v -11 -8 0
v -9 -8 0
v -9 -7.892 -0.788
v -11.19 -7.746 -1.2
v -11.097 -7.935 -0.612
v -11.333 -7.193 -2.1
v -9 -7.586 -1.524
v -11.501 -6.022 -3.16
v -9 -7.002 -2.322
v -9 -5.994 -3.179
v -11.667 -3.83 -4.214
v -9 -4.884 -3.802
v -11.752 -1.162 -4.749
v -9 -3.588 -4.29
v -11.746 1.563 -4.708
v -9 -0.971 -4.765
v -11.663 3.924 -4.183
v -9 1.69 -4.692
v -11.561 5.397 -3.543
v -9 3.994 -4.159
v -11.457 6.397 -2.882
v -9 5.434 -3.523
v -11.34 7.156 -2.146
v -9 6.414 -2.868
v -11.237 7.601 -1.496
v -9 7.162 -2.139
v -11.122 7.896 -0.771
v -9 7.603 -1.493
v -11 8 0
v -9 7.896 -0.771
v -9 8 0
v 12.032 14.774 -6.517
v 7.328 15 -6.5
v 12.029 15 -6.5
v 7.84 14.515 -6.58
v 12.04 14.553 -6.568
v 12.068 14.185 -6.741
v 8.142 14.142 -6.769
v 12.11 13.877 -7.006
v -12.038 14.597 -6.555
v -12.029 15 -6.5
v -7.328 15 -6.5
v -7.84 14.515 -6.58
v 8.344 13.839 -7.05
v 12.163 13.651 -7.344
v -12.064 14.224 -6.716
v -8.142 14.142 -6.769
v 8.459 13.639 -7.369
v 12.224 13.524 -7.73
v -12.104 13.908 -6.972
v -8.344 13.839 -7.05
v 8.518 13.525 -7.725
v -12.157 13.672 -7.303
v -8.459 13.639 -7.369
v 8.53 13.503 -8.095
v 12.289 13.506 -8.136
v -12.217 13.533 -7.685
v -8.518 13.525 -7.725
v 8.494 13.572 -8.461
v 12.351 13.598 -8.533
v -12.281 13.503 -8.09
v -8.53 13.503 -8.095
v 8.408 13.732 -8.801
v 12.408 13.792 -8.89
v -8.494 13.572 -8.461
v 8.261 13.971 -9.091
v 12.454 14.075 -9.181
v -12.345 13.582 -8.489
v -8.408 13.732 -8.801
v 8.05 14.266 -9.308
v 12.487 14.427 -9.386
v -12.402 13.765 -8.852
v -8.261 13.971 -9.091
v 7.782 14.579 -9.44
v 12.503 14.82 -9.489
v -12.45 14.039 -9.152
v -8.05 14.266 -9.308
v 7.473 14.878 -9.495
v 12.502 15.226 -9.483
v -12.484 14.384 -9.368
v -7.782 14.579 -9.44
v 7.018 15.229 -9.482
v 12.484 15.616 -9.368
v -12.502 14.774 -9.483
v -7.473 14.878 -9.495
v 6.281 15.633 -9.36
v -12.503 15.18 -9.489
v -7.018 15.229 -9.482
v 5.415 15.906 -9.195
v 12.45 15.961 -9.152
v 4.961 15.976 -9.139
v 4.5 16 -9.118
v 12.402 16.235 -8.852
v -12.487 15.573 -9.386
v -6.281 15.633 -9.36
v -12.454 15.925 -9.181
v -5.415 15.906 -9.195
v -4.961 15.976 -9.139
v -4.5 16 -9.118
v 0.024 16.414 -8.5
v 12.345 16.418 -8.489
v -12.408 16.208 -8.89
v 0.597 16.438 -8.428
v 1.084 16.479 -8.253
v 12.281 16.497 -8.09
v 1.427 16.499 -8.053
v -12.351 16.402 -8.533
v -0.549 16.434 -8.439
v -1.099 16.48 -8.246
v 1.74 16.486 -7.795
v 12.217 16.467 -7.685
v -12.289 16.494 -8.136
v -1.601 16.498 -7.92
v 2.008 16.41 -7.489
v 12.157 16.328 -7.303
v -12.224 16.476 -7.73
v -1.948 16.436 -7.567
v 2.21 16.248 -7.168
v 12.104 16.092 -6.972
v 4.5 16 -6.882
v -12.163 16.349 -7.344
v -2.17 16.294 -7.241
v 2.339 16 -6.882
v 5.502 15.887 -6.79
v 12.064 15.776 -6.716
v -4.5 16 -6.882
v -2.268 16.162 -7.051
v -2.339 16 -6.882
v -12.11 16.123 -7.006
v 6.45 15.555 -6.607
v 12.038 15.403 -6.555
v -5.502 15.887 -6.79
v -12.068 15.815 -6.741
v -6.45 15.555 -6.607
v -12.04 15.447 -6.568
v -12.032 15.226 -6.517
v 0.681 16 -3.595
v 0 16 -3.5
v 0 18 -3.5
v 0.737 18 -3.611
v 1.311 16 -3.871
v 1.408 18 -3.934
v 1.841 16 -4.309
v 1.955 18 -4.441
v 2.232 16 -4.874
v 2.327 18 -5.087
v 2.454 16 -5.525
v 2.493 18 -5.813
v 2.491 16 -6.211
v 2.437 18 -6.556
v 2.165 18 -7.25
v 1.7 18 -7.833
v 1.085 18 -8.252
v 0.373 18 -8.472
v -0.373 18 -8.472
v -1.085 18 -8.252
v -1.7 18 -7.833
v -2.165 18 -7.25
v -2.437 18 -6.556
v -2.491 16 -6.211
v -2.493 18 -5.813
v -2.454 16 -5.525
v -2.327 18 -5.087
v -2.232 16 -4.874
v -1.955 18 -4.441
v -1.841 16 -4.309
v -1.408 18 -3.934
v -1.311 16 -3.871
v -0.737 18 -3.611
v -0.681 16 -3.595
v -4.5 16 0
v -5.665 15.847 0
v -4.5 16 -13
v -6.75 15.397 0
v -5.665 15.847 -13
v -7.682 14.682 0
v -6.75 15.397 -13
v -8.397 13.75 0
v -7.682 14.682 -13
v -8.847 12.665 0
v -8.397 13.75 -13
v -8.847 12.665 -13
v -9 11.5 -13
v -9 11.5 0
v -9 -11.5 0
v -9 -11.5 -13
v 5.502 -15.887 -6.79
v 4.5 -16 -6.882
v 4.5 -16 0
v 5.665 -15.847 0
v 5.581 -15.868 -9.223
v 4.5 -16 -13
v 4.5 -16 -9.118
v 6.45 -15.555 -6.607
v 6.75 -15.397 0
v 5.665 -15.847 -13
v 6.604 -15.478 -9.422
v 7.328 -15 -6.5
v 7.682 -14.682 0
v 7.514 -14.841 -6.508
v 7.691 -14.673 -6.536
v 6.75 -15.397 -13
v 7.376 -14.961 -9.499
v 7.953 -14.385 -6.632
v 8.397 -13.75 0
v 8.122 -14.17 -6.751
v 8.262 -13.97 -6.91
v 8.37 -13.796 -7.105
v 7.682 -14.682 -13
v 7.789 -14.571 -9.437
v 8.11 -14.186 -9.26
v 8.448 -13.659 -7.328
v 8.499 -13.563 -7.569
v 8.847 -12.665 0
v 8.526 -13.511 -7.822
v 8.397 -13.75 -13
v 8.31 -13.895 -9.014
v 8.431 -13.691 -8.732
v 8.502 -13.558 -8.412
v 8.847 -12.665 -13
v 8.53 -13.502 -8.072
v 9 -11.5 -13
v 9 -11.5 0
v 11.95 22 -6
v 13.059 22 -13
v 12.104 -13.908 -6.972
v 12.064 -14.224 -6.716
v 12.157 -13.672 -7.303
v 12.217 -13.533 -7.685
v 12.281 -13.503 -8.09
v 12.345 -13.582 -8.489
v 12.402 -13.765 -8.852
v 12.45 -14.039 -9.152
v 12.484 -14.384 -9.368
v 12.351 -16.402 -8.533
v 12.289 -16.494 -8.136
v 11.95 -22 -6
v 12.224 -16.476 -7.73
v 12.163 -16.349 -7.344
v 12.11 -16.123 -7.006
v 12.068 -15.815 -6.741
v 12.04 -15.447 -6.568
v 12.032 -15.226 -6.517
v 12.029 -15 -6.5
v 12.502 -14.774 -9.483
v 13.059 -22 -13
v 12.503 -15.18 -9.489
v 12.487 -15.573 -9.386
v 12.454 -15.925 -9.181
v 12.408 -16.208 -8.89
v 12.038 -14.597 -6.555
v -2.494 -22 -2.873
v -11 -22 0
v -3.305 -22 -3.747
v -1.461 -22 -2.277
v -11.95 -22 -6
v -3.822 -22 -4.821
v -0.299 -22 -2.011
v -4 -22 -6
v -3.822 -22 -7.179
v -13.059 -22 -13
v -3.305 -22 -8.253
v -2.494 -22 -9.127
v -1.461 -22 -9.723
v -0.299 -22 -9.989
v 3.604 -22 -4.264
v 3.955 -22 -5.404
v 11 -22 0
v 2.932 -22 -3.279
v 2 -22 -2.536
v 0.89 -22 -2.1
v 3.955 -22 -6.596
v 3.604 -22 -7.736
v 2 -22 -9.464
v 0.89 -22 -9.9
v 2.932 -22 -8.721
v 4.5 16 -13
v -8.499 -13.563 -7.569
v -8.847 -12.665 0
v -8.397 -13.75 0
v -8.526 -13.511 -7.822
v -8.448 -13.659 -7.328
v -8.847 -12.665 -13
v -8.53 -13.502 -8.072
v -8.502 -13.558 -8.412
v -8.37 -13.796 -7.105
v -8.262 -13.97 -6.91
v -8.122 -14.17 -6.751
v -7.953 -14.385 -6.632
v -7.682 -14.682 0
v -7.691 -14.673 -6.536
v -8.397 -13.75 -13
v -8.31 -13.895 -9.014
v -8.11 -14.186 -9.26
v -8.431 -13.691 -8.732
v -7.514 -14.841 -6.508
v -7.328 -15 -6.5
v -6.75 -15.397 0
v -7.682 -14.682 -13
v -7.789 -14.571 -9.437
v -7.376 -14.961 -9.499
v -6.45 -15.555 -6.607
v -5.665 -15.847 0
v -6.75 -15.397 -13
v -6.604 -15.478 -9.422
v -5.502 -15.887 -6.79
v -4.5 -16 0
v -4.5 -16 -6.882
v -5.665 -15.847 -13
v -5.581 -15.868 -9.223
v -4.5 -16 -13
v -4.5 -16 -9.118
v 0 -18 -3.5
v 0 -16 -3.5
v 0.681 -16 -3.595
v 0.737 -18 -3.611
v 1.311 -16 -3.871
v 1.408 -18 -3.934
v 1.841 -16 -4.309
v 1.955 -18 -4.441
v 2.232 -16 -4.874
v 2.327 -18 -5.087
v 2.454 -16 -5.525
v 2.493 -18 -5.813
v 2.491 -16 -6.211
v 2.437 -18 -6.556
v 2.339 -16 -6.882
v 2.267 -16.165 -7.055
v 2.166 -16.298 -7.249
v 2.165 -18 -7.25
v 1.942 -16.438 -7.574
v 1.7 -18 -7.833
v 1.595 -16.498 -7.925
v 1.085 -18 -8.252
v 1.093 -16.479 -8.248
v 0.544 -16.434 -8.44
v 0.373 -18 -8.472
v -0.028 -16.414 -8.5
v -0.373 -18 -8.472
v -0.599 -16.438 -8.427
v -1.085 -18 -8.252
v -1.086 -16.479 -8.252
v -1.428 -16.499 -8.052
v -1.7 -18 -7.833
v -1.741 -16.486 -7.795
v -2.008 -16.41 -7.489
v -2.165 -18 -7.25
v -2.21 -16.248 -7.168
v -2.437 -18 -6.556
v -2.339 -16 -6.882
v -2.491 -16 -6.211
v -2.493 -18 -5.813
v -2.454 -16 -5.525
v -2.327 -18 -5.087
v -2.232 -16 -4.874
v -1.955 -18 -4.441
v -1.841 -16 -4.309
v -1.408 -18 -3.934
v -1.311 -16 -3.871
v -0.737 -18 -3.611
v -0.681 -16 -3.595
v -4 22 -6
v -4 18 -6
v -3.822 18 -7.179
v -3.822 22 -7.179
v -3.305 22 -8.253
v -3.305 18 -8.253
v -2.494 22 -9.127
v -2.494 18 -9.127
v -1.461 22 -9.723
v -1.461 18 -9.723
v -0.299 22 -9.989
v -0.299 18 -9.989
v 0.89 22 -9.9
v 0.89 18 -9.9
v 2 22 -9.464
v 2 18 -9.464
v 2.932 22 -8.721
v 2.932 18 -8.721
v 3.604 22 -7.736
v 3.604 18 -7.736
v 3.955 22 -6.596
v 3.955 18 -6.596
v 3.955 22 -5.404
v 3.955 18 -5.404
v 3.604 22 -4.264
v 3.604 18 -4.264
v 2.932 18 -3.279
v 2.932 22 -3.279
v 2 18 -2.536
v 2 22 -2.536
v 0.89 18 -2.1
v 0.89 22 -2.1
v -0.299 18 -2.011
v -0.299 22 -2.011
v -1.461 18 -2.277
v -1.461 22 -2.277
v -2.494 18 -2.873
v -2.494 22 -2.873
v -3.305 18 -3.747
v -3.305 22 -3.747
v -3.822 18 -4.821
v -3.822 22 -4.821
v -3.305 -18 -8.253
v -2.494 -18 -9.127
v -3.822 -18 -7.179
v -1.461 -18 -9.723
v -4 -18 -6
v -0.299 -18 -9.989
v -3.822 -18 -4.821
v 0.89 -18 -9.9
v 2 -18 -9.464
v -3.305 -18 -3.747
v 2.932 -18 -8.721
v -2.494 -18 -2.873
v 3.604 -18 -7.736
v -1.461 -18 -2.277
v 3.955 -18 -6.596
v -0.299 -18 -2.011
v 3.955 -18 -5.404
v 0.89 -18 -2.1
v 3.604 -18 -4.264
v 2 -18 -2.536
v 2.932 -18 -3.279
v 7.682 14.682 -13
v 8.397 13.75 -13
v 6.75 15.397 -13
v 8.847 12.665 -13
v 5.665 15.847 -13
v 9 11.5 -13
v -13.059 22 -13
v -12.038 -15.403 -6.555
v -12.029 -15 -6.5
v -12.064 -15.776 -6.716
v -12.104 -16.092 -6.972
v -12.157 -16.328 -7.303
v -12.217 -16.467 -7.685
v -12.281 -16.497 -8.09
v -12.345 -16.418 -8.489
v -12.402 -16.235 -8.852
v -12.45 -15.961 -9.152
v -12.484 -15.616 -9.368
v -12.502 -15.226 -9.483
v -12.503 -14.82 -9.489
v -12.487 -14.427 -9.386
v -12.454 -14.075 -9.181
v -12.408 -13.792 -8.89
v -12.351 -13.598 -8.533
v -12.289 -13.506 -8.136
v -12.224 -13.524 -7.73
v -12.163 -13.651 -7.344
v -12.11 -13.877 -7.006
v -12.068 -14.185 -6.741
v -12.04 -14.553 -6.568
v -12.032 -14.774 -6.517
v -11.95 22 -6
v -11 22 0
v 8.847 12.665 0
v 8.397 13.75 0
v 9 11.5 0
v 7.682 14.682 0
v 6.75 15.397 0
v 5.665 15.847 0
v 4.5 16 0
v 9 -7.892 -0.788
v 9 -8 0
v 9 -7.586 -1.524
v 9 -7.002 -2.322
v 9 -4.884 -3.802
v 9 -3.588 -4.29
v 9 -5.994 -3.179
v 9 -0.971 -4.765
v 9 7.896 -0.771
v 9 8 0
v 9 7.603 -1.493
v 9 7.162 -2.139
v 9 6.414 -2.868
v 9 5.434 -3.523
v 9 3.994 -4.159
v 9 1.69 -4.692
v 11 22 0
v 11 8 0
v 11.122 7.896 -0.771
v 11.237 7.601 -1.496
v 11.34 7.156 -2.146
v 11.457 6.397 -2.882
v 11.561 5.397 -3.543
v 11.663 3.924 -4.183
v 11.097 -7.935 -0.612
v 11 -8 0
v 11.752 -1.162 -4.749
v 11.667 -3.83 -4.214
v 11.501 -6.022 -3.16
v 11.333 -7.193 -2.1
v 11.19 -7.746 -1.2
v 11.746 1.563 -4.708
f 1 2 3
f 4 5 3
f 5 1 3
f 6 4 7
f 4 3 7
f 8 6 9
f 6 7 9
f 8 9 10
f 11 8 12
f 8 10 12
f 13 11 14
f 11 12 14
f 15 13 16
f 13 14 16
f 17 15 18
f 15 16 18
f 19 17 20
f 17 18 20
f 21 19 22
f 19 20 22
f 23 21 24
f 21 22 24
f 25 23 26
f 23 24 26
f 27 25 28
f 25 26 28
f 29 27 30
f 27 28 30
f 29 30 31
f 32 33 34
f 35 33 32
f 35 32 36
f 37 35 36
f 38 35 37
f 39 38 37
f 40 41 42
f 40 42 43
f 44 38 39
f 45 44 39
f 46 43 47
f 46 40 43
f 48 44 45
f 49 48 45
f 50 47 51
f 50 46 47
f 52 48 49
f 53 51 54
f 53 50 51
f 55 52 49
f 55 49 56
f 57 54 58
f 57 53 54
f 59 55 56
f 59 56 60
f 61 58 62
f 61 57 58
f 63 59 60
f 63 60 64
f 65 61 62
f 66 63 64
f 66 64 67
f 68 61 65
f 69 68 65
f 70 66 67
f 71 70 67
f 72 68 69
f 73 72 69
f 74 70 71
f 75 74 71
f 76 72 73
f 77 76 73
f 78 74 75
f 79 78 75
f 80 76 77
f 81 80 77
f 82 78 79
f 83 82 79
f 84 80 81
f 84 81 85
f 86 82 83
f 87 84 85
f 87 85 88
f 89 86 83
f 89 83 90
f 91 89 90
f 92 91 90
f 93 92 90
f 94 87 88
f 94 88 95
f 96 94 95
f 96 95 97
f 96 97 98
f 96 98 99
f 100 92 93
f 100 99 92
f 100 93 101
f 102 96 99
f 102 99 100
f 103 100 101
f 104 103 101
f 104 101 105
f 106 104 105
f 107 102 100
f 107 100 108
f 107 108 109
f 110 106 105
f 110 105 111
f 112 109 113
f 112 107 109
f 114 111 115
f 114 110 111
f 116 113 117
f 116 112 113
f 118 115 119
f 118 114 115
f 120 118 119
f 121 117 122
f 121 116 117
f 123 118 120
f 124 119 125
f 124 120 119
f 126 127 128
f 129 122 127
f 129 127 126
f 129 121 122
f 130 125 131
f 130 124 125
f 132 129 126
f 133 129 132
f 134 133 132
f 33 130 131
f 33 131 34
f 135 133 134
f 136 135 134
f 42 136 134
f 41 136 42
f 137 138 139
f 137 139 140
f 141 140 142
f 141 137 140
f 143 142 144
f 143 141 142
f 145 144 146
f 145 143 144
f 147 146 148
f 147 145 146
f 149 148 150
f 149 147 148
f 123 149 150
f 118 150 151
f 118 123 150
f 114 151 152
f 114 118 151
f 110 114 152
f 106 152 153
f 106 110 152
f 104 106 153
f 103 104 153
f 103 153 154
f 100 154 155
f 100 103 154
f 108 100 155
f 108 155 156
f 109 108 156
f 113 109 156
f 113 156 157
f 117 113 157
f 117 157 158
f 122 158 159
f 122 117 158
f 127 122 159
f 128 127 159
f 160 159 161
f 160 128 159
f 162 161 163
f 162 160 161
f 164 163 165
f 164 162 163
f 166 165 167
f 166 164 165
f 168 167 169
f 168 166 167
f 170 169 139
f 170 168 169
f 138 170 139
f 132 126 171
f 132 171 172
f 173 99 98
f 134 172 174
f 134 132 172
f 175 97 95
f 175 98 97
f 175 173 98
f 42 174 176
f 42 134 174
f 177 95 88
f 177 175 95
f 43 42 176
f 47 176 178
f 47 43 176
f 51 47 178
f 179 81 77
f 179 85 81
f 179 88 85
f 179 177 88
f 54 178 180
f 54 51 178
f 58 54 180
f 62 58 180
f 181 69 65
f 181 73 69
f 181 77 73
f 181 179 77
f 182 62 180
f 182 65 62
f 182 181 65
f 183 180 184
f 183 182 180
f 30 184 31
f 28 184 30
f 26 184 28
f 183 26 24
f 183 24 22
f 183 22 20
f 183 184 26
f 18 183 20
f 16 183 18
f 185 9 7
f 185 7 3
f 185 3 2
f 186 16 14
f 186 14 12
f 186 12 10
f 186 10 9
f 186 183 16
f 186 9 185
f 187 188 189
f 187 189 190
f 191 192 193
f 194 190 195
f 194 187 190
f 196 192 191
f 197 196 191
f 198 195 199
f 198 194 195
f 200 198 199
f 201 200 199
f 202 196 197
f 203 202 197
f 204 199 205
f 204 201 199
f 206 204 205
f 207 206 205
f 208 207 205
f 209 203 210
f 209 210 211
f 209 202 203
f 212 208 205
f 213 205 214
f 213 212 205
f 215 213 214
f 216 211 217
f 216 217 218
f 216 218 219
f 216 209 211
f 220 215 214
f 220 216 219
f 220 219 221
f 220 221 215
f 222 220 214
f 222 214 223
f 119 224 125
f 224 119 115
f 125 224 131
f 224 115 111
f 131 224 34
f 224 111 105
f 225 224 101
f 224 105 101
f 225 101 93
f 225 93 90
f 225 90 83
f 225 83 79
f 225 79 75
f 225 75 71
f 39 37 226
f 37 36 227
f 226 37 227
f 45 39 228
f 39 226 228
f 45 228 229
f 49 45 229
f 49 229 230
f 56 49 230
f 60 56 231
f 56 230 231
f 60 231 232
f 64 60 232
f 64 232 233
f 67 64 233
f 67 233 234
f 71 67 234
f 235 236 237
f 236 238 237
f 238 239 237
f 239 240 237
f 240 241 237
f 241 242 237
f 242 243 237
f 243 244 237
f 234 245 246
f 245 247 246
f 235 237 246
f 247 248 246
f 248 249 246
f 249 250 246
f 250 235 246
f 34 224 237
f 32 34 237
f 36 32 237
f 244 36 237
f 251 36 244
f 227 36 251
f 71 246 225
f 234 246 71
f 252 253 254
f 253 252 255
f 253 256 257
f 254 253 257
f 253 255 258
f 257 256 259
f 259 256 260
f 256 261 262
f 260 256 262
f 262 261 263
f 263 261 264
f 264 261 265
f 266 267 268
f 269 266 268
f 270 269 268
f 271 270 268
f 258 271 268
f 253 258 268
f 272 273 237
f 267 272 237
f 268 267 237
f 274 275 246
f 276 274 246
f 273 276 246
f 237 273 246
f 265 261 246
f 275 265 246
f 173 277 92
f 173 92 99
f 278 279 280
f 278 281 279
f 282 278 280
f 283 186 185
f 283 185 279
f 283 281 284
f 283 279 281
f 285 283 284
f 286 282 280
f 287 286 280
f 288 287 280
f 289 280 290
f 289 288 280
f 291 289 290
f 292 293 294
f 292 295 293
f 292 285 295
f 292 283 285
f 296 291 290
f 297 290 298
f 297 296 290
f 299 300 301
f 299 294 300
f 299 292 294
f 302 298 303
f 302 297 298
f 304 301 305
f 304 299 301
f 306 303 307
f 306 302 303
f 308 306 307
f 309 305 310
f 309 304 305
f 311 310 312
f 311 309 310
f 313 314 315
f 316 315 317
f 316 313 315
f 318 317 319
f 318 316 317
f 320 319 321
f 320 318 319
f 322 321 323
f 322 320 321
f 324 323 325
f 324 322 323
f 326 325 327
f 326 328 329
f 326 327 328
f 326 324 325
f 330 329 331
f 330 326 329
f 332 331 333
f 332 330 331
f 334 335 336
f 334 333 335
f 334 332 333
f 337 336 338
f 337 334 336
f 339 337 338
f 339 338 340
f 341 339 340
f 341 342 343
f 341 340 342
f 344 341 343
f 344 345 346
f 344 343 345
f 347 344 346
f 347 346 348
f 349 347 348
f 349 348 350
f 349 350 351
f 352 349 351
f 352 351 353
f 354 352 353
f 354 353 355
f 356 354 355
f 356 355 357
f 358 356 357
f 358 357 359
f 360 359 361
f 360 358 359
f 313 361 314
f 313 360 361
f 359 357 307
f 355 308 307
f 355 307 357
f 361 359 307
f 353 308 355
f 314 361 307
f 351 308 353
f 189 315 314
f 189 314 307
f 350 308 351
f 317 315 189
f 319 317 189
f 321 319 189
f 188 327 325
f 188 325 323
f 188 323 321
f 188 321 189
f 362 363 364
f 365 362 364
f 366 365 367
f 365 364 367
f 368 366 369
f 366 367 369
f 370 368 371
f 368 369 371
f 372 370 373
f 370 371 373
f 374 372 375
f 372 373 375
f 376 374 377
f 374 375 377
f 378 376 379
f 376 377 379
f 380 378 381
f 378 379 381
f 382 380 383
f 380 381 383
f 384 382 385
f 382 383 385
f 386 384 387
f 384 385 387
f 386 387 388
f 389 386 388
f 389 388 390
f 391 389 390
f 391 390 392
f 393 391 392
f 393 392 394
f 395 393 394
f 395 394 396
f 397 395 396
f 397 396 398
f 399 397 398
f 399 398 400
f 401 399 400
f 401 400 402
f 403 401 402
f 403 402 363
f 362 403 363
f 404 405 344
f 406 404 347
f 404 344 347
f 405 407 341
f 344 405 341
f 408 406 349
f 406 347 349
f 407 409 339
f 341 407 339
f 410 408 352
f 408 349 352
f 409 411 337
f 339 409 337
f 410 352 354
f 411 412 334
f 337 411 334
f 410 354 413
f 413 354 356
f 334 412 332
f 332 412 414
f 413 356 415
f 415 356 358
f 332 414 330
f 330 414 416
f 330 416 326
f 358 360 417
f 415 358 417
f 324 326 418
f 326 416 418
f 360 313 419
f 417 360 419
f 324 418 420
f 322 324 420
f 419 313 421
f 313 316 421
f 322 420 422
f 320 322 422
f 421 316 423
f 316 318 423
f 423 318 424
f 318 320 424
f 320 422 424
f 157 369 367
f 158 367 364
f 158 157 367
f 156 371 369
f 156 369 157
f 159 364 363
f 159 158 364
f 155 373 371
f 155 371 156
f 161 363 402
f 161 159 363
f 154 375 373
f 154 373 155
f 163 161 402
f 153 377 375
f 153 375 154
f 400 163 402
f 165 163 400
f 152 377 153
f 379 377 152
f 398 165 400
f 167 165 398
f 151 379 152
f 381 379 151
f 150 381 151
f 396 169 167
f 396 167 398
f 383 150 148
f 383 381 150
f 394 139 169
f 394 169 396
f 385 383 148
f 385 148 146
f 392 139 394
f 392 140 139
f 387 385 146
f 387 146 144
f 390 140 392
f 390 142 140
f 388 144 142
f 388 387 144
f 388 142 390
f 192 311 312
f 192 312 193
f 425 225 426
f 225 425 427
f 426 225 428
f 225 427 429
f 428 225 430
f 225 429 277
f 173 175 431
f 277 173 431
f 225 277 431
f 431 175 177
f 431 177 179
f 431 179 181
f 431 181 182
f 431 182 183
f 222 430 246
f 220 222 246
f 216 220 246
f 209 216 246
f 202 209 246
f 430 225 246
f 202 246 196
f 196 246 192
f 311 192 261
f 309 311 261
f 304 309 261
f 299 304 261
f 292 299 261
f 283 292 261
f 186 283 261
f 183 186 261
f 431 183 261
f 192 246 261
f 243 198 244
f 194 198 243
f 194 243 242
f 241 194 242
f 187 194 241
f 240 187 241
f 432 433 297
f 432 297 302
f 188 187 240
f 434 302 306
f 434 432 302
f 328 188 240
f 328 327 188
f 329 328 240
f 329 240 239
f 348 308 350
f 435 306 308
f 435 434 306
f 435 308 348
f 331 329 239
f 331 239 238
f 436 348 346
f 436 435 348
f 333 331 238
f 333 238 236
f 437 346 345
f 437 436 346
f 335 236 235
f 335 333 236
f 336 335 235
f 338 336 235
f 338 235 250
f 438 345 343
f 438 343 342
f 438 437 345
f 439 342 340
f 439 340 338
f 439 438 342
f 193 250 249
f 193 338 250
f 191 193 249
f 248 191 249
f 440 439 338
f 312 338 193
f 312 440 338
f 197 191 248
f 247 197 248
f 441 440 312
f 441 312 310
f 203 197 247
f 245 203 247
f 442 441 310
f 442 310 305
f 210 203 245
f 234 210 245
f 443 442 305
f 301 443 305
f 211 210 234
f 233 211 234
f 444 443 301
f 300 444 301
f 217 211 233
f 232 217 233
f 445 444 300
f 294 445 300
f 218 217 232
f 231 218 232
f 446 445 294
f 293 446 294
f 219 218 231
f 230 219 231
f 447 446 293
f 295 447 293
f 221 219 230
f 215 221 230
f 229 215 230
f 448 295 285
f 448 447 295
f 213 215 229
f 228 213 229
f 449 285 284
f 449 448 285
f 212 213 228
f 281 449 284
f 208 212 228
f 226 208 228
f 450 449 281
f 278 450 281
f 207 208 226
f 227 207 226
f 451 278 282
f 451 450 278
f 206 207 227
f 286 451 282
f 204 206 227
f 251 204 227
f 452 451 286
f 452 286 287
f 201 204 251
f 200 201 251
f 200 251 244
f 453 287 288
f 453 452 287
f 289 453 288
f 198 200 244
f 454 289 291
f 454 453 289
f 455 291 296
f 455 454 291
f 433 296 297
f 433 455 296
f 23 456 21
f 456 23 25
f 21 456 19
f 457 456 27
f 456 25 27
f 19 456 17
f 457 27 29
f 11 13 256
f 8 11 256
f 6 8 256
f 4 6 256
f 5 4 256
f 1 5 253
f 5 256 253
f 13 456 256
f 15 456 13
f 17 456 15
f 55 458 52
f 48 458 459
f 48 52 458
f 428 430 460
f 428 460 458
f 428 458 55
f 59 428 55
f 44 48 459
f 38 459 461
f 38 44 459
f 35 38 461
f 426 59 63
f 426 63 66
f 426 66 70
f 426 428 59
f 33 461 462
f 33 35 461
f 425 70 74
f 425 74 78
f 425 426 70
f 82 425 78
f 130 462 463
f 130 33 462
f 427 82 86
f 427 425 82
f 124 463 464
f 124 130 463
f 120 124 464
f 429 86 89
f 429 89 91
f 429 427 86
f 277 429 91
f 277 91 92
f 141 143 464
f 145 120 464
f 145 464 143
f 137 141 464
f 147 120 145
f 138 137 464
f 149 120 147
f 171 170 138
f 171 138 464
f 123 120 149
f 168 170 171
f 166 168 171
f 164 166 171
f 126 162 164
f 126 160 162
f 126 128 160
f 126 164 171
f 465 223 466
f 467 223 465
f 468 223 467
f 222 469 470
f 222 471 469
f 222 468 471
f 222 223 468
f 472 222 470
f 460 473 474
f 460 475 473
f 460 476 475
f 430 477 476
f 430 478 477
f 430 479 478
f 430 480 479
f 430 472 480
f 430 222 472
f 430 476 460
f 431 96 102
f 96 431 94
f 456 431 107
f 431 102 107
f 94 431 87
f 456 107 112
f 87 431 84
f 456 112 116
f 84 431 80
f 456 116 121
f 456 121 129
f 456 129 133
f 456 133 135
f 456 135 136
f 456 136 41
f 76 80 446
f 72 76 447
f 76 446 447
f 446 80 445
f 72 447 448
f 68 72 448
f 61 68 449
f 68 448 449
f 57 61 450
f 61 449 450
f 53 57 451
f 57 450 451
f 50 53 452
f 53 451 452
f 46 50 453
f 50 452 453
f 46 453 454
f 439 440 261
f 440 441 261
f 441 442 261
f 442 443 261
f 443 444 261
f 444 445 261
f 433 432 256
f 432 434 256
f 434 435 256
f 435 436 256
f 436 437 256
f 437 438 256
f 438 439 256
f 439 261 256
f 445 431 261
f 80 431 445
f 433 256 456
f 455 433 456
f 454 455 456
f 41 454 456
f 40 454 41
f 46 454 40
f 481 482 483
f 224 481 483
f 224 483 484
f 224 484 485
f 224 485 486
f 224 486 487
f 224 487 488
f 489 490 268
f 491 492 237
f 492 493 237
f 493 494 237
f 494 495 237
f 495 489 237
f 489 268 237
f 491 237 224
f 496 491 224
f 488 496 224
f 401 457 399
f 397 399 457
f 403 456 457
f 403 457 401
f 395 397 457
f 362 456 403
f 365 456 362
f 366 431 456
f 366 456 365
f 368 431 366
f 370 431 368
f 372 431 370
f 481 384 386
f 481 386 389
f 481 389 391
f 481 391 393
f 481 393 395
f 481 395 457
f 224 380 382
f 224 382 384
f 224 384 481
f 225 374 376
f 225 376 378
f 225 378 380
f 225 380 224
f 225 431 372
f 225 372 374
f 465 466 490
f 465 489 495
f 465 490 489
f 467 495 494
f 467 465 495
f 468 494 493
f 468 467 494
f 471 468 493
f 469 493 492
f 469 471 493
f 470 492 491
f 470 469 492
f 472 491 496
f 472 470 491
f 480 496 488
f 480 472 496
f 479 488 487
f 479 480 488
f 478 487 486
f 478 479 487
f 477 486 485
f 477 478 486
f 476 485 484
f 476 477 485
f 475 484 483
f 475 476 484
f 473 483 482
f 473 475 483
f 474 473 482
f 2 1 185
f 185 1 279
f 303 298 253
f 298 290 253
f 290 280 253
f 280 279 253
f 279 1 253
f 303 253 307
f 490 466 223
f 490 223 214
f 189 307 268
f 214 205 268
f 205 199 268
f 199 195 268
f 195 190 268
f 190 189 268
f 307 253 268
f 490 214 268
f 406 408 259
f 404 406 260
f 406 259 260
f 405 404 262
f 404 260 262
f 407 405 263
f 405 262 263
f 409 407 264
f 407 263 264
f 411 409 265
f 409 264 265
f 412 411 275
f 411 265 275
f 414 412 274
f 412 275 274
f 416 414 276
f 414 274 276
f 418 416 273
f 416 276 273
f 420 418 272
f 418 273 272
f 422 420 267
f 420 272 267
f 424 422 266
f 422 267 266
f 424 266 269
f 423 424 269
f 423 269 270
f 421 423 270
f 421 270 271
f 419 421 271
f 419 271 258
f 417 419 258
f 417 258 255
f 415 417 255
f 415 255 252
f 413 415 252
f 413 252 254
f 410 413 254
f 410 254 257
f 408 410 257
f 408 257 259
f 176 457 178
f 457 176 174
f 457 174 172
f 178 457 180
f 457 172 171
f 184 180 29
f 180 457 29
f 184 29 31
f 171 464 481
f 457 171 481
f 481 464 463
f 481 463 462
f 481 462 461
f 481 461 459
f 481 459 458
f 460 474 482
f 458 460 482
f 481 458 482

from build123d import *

# Parameters (mm, degrees)
BOSS_EXTRUDE1_DEPTH            = 22
BOSS_EXTRUDE1_DEPTH_BACK       = 22
BOSS_EXTRUDE3_DEPTH            = 18
BOSS_EXTRUDE3_DEPTH_BACK       = 18
SKETCH5_R                      = 4
SKETCH5_R_2                    = 2.5
CUT_EXTRUDE1_DEPTH             = 43
CUT_EXTRUDE1_DEPTH_BACK        = 43
SKETCH3_R                      = 1.5
CUT_EXTRUDE3_DEPTH             = 27
CUT_EXTRUDE3_DEPTH_BACK        = 24
CUT_EXTRUDE4_REACH             = 30.697
SKETCH7_RX                     = 8
SKETCH7_RY                     = 4.8
CUT_EXTRUDE4_DIRECTION_2_REACH = 30.697


with BuildPart() as part:
    # Sketch1 → Boss-Extrude1 (new, two sides: drawn at the far end of the back side and taken through both)
    with BuildSketch(Plane(origin=(0, 0, 0), x_dir=(1, 0, 0), z_dir=(0, 1, 0)).offset(-BOSS_EXTRUDE1_DEPTH_BACK)):
        with BuildLine():
            Line((-11.950306642, 6), (-11, 0))
            Line((-11, 0), (11, 0))
            Line((11, 0), (11.950306642, 6))
            Line((11.950306642, 6), (4, 6))
            ThreePointArc((4, 6), (0, 2), (-4, 6))
            Line((-4, 6), (-11.950306642, 6))
        make_face()
        with BuildLine():
            Line((-7.641307543, 10), (-11.950306642, 6))
            Line((-11.950306642, 6), (-4, 6))
            ThreePointArc((-4, 6), (0, 10), (4, 6))
            Line((4, 6), (11.950306642, 6))
            Line((11.950306642, 6), (7.641307543, 10))
            ThreePointArc((7.641307543, 10), (4.104557854, 12.223132826), (-1.7e-08, 13))
            ThreePointArc((-1.7e-08, 13), (-4.10455787, 12.223132819), (-7.641307543, 10))
        make_face()
        with BuildLine():
            Line((-13.058997724, 13), (-11.950306642, 6))
            Line((-11.950306642, 6), (-7.641307543, 10))
            ThreePointArc((-7.641307543, 10), (-4.10455787, 12.223132819), (-1.7e-08, 13))
            Line((-1.7e-08, 13), (-2.687473981, 13))
            Line((-2.687473981, 13), (-13.058997724, 13))
        make_face()
        with BuildLine():
            Line((7.641307543, 10), (11.950306642, 6))
            Line((11.950306642, 6), (13.058997724, 13))
            Line((13.058997724, 13), (2.687473981, 13))
            Line((2.687473981, 13), (-1.7e-08, 13))
            ThreePointArc((-1.7e-08, 13), (4.104557854, 12.223132826), (7.641307543, 10))
        make_face()
    extrude(amount=BOSS_EXTRUDE1_DEPTH + BOSS_EXTRUDE1_DEPTH_BACK)

    # Sketch5 → Boss-Extrude3 (add, two sides: drawn at the far end of the back side and taken through both)
    with BuildSketch(Plane(origin=(0, 0, 0), x_dir=(1, 0, 0), z_dir=(0, 1, 0)).offset(-BOSS_EXTRUDE3_DEPTH_BACK)):
        with Locations(Location((0, 6, 0), (0, 0, 270))):
            Circle(SKETCH5_R)
        with Locations(Location((0, 6, 0), (0, 0, 270))):
            Circle(SKETCH5_R_2, mode=Mode.SUBTRACT)
    extrude(amount=BOSS_EXTRUDE3_DEPTH + BOSS_EXTRUDE3_DEPTH_BACK)

    # Sketch3 → Cut-Extrude1 (cut, two sides: drawn at the far end of the back side and taken through both)
    with BuildSketch(Plane(origin=(0, 0, 0), x_dir=(0, 0, -1), z_dir=(1, 0, 0)).offset(-CUT_EXTRUDE1_DEPTH_BACK)):
        with Locations(Location((8, 15, 0), (0, 0, 180))):
            Circle(SKETCH3_R)
        with Locations(Location((8, -15, 0), (0, 0, 180))):
            Circle(SKETCH3_R)
    extrude(amount=CUT_EXTRUDE1_DEPTH + CUT_EXTRUDE1_DEPTH_BACK, mode=Mode.SUBTRACT)

    # Sketch6 → Cut-Extrude3 (cut, two sides: drawn at the far end of the back side and taken through both)
    with BuildSketch(Plane.XY.offset(-CUT_EXTRUDE3_DEPTH_BACK)):
        with BuildLine():
            ThreePointArc((-9, -11.5), (-7.681980515, -14.681980515), (-4.5, -16))
            Line((-4.5, -16), (4.5, -16))
            ThreePointArc((4.5, -16), (7.681980515, -14.681980515), (9, -11.5))
            Line((9, -11.5), (9, 11.5))
            ThreePointArc((9, 11.5), (7.681980515, 14.681980515), (4.5, 16))
            Line((4.5, 16), (-4.5, 16))
            ThreePointArc((-4.5, 16), (-7.681980515, 14.681980515), (-9, 11.5))
            Line((-9, 11.5), (-9, -11.5))
        make_face()
    extrude(amount=CUT_EXTRUDE3_DEPTH + CUT_EXTRUDE3_DEPTH_BACK, mode=Mode.SUBTRACT)

    # Cut-Extrude4: up to this plane
    cut_extrude4_end = Plane(origin=(-10.73081084, -22, 1.699593469), z_dir=(-0.9876883405951371, 0, 0.15643446504023473))
    # Sketch7 → Cut-Extrude4 (cut, up to the surface)
    with BuildSketch(Plane(origin=(0, 0, 0), x_dir=(0, 0, -1), z_dir=(1, 0, 0)), mode=Mode.PRIVATE) as cut_extrude4_sk1:
        with Locations(Location((0, 0), (0, 0, 90))):
            Ellipse(SKETCH7_RX, SKETCH7_RY)
    cut_extrude4_tool1 = split(extrude(cut_extrude4_sk1.sketch, amount=-CUT_EXTRUDE4_REACH, mode=Mode.PRIVATE), bisect_by=cut_extrude4_end, keep=Keep.BOTH, mode=Mode.PRIVATE)
    add(cut_extrude4_tool1.solids().sort_by_distance((0, 0, 0))[0], mode=Mode.SUBTRACT)

    # Cut-Extrude4 direction 2: up to this plane
    cut_extrude4_direction_2_end = Plane(origin=(10.73081084, -22, 1.699593469), z_dir=(-0.9876883405951371, 0, -0.15643446504023442))
    # Sketch7 → Cut-Extrude4 direction 2 (cut, up to the surface)
    with BuildSketch(Plane(origin=(0, 0, 0), x_dir=(0, 0, -1), z_dir=(1, 0, 0)), mode=Mode.PRIVATE) as cut_extrude4_direction_2_sk1:
        with Locations(Location((0, 0), (0, 0, 90))):
            Ellipse(SKETCH7_RX, SKETCH7_RY)
    cut_extrude4_direction_2_tool1 = split(extrude(cut_extrude4_direction_2_sk1.sketch, amount=CUT_EXTRUDE4_DIRECTION_2_REACH, mode=Mode.PRIVATE), bisect_by=cut_extrude4_direction_2_end, keep=Keep.BOTH, mode=Mode.PRIVATE)
    add(cut_extrude4_direction_2_tool1.solids().sort_by_distance((0, 0, 0))[0], mode=Mode.SUBTRACT)


solid = part.part
